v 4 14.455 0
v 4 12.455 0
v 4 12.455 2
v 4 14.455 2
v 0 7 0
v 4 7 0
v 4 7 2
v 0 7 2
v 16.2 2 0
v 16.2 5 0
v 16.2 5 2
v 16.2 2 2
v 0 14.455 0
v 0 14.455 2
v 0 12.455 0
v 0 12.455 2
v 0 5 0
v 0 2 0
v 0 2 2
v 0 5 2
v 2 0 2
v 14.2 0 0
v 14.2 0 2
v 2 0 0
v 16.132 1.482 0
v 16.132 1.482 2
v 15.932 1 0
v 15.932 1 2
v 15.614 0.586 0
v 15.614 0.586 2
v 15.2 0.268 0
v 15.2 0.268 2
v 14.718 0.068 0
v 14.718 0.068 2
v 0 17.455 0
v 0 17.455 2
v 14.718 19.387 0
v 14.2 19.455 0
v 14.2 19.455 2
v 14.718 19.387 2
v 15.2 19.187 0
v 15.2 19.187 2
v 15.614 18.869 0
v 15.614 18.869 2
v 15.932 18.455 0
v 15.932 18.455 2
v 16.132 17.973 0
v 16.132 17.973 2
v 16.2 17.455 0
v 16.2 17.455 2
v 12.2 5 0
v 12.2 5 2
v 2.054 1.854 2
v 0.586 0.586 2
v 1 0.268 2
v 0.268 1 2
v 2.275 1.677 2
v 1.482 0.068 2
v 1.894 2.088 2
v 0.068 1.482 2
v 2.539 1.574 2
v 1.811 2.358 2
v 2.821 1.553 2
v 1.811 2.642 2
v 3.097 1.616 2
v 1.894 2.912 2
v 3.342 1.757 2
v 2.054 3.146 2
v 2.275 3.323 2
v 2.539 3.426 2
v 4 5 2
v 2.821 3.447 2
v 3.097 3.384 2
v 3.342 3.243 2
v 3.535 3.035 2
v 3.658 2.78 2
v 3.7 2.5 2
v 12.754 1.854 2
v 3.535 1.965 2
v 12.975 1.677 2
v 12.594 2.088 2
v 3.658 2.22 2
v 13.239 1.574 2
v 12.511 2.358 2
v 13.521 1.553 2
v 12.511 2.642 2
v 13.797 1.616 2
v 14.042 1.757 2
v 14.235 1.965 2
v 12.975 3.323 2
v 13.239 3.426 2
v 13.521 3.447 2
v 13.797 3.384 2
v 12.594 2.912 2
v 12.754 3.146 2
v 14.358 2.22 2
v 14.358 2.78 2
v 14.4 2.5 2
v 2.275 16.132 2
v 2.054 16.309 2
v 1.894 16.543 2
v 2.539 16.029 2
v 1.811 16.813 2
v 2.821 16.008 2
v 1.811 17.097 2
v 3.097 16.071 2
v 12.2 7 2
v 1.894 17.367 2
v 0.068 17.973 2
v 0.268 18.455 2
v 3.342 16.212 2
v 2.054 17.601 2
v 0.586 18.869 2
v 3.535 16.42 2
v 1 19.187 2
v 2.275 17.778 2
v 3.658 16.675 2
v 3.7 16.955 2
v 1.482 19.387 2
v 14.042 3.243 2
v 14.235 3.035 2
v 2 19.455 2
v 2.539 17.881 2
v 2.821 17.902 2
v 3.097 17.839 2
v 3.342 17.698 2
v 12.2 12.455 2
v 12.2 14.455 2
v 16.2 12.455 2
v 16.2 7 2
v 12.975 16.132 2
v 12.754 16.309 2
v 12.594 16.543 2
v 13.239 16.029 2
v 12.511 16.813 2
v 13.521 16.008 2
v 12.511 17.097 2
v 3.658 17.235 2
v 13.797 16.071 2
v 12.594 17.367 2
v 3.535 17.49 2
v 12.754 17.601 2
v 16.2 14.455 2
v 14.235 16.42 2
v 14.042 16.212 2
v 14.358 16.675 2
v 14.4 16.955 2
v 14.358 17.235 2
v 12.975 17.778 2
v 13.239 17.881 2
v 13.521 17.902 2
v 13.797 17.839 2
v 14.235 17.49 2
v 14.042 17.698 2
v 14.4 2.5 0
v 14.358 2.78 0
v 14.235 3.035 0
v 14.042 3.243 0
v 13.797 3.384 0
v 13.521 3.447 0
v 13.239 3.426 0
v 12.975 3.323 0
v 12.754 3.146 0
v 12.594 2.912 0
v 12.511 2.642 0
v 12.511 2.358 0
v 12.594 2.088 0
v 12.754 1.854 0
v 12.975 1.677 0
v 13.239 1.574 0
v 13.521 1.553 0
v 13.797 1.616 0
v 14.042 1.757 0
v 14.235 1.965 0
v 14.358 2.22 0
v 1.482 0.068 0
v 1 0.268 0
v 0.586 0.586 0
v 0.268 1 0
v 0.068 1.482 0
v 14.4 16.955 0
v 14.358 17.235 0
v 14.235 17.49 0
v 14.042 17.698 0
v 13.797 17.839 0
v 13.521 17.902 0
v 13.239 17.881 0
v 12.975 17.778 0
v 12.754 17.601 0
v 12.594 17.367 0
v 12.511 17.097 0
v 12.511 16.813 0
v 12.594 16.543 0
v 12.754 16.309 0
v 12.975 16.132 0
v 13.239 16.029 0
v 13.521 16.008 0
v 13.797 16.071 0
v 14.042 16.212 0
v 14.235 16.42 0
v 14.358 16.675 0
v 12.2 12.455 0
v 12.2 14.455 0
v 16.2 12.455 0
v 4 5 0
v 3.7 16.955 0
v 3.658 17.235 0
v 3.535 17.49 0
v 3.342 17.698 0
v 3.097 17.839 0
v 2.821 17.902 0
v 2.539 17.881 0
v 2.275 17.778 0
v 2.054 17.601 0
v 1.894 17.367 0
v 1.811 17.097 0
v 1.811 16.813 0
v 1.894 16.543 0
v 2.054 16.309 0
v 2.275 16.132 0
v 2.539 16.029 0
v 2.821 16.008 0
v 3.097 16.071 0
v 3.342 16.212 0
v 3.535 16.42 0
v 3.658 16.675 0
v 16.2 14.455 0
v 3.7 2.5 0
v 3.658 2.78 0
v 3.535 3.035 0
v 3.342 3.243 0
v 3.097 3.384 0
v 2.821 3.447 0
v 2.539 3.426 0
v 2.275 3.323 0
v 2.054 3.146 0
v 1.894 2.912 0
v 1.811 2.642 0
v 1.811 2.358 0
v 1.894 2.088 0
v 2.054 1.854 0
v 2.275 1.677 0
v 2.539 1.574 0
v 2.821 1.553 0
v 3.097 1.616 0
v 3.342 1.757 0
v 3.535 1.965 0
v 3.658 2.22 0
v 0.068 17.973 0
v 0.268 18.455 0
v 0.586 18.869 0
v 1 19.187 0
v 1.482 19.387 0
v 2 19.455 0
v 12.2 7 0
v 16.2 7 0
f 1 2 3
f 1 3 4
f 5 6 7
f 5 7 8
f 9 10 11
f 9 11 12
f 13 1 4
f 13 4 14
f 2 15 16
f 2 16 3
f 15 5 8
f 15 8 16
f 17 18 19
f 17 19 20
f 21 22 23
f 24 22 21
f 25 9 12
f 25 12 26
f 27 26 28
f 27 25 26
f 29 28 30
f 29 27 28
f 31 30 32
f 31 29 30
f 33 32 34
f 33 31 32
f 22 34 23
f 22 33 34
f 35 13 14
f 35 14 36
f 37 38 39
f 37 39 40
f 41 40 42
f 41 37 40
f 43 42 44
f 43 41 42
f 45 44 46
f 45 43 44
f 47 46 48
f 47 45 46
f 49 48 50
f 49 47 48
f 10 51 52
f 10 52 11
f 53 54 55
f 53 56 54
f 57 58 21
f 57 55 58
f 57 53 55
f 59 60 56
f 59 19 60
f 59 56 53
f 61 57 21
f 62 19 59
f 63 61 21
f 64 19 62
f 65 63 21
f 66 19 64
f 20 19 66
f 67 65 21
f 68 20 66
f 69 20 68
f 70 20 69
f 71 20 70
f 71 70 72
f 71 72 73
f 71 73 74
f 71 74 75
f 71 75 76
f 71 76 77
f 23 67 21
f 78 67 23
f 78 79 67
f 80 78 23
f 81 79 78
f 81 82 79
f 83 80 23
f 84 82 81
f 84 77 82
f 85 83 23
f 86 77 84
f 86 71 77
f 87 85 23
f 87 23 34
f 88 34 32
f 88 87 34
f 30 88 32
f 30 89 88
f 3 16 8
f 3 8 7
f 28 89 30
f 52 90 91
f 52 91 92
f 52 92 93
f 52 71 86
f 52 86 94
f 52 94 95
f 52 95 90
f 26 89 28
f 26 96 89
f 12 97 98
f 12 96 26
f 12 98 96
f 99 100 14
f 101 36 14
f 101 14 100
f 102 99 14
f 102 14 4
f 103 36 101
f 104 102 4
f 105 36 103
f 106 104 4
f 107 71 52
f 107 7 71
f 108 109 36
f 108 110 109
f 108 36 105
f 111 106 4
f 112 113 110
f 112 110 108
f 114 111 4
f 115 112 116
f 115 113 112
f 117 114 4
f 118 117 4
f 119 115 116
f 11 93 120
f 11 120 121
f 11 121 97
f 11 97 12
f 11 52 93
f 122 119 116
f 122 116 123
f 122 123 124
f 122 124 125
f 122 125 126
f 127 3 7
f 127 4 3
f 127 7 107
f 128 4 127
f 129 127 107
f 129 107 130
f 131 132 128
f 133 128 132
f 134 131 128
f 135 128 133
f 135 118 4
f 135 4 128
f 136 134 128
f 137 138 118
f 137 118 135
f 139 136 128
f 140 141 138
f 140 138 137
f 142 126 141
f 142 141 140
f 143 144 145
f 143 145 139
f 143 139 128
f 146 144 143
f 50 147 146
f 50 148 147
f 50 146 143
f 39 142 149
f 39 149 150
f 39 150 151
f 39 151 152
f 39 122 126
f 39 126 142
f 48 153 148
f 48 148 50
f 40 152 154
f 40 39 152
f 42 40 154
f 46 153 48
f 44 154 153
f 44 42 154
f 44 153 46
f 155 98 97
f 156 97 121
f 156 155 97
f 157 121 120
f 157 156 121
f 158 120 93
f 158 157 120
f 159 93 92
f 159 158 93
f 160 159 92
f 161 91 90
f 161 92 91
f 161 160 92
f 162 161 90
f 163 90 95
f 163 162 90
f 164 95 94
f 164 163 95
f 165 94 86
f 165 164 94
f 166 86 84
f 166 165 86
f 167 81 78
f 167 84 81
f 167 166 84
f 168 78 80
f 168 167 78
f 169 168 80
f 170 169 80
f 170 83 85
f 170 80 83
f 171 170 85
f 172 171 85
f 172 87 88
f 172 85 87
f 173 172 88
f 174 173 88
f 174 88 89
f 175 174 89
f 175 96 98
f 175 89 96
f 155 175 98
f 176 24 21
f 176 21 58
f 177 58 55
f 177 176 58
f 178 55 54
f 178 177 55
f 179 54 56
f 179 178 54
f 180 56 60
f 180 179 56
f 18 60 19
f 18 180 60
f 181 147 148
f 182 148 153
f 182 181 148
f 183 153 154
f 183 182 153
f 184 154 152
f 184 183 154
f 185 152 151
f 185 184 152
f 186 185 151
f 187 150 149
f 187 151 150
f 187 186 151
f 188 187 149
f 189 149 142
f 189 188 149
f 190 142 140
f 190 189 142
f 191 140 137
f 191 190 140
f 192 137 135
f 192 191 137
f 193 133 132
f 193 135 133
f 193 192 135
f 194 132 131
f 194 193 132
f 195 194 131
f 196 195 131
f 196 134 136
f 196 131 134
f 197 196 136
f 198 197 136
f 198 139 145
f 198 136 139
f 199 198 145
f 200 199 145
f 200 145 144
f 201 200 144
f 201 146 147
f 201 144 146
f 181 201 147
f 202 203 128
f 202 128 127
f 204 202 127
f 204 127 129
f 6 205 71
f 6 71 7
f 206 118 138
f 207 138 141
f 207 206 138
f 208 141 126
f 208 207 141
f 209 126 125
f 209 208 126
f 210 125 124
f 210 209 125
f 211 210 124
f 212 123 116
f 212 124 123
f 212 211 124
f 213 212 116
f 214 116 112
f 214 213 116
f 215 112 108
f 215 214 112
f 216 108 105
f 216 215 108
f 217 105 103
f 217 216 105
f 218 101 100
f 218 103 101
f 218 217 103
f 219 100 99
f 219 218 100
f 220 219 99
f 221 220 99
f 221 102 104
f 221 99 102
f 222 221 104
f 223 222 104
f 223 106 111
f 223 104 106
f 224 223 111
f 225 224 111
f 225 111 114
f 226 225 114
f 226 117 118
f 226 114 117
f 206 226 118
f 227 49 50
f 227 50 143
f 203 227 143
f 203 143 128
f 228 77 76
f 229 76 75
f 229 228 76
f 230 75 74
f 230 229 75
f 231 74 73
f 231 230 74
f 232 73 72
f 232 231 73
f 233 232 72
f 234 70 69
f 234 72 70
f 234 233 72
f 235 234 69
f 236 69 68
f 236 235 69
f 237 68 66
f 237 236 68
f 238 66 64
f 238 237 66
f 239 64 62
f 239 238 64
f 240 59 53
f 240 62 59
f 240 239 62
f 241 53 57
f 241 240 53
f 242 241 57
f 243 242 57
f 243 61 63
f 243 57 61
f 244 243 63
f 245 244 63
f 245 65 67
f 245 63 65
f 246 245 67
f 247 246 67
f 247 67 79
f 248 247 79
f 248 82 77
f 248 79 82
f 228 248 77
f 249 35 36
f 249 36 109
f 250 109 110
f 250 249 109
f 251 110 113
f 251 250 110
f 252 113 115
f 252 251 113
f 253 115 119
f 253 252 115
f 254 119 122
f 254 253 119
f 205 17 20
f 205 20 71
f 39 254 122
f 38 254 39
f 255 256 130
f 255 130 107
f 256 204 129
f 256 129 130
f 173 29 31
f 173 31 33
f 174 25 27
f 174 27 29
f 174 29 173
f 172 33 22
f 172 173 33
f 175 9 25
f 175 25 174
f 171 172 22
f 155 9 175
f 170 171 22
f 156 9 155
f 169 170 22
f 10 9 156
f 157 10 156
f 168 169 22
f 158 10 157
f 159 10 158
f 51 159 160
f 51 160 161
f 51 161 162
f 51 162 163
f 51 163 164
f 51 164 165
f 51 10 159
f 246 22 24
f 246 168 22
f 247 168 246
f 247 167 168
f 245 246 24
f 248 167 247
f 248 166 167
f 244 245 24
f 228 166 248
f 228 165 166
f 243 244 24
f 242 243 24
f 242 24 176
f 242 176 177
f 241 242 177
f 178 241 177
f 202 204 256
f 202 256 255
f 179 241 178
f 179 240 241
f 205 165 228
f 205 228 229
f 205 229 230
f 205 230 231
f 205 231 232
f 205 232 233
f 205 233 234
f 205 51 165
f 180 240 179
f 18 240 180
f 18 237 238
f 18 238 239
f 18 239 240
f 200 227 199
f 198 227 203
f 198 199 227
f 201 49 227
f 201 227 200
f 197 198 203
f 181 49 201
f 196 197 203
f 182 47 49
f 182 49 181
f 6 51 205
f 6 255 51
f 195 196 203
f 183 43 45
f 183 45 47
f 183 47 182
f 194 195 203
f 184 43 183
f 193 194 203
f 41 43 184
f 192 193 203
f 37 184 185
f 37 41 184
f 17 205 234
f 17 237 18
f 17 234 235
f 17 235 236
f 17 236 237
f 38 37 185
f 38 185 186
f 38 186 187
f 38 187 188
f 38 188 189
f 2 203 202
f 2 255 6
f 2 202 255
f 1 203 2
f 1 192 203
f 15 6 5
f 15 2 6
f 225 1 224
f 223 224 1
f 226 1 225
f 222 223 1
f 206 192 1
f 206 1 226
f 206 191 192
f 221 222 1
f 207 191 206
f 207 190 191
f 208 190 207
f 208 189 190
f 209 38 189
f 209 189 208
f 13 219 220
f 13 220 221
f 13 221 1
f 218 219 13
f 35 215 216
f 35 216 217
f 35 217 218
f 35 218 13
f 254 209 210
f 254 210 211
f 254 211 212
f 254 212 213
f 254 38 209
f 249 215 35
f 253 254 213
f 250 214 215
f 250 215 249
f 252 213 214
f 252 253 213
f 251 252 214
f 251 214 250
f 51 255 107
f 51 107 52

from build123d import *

# Parameters (mm, degrees)
SKETCH2_R           = 0.95
BOSS_EXTRUDE1_DEPTH = 4
SKETCH3_W           = 16.2
SKETCH3_H           = 19.455
CUT_EXTRUDE1_DEPTH  = 2


with BuildPart() as part:
    # Sketch2 → Boss-Extrude1 (new body)
    with BuildSketch(Plane.XY):
        with BuildLine():
            Line((0, 7), (0, 12.455))
            Line((0, 12.455), (4, 12.455))
            Line((4, 12.455), (4, 14.455))
            Line((4, 14.455), (0, 14.455))
            Line((0, 14.455), (0, 17.455))
            ThreePointArc((0, 17.455), (0.585786438, 18.869213562), (2, 19.455))
            Line((2, 19.455), (14.2, 19.455))
            ThreePointArc((14.2, 19.455), (15.614213562, 18.869213562), (16.2, 17.455))
            Line((16.2, 17.455), (16.2, 14.455))
            Line((16.2, 14.455), (12.2, 14.455))
            Line((12.2, 14.455), (12.2, 12.455))
            Line((12.2, 12.455), (16.2, 12.455))
            Line((16.2, 12.455), (16.2, 7))
            Line((16.2, 7), (12.2, 7))
            Line((12.2, 7), (12.2, 5))
            Line((12.2, 5), (16.2, 5))
            Line((16.2, 5), (16.2, 2))
            ThreePointArc((16.2, 2), (15.614213562, 0.585786438), (14.2, 0))
            Line((14.2, 0), (2, 0))
            ThreePointArc((2, 0), (0.585786438, 0.585786438), (0, 2))
            Line((0, 2), (0, 5))
            Line((0, 5), (4, 5))
            Line((4, 5), (4, 7))
            Line((4, 7), (0, 7))
        make_face()
        with Locations((13.45, 2.5)):
            Circle(SKETCH2_R, mode=Mode.SUBTRACT)
        with Locations((2.75, 16.955)):
            Circle(SKETCH2_R, mode=Mode.SUBTRACT)
        with Locations((2.75, 2.5)):
            Circle(SKETCH2_R, mode=Mode.SUBTRACT)
        with Locations((13.45, 16.955)):
            Circle(SKETCH2_R, mode=Mode.SUBTRACT)
    extrude(amount=BOSS_EXTRUDE1_DEPTH)

    # Sketch3 → Cut-Extrude1 (cut)
    with BuildSketch(Plane.XY.offset(4)):
        with Locations((8.1, 9.7275)):
            Rectangle(SKETCH3_W, SKETCH3_H)
    extrude(amount=-CUT_EXTRUDE1_DEPTH, mode=Mode.SUBTRACT)


solid = part.part
